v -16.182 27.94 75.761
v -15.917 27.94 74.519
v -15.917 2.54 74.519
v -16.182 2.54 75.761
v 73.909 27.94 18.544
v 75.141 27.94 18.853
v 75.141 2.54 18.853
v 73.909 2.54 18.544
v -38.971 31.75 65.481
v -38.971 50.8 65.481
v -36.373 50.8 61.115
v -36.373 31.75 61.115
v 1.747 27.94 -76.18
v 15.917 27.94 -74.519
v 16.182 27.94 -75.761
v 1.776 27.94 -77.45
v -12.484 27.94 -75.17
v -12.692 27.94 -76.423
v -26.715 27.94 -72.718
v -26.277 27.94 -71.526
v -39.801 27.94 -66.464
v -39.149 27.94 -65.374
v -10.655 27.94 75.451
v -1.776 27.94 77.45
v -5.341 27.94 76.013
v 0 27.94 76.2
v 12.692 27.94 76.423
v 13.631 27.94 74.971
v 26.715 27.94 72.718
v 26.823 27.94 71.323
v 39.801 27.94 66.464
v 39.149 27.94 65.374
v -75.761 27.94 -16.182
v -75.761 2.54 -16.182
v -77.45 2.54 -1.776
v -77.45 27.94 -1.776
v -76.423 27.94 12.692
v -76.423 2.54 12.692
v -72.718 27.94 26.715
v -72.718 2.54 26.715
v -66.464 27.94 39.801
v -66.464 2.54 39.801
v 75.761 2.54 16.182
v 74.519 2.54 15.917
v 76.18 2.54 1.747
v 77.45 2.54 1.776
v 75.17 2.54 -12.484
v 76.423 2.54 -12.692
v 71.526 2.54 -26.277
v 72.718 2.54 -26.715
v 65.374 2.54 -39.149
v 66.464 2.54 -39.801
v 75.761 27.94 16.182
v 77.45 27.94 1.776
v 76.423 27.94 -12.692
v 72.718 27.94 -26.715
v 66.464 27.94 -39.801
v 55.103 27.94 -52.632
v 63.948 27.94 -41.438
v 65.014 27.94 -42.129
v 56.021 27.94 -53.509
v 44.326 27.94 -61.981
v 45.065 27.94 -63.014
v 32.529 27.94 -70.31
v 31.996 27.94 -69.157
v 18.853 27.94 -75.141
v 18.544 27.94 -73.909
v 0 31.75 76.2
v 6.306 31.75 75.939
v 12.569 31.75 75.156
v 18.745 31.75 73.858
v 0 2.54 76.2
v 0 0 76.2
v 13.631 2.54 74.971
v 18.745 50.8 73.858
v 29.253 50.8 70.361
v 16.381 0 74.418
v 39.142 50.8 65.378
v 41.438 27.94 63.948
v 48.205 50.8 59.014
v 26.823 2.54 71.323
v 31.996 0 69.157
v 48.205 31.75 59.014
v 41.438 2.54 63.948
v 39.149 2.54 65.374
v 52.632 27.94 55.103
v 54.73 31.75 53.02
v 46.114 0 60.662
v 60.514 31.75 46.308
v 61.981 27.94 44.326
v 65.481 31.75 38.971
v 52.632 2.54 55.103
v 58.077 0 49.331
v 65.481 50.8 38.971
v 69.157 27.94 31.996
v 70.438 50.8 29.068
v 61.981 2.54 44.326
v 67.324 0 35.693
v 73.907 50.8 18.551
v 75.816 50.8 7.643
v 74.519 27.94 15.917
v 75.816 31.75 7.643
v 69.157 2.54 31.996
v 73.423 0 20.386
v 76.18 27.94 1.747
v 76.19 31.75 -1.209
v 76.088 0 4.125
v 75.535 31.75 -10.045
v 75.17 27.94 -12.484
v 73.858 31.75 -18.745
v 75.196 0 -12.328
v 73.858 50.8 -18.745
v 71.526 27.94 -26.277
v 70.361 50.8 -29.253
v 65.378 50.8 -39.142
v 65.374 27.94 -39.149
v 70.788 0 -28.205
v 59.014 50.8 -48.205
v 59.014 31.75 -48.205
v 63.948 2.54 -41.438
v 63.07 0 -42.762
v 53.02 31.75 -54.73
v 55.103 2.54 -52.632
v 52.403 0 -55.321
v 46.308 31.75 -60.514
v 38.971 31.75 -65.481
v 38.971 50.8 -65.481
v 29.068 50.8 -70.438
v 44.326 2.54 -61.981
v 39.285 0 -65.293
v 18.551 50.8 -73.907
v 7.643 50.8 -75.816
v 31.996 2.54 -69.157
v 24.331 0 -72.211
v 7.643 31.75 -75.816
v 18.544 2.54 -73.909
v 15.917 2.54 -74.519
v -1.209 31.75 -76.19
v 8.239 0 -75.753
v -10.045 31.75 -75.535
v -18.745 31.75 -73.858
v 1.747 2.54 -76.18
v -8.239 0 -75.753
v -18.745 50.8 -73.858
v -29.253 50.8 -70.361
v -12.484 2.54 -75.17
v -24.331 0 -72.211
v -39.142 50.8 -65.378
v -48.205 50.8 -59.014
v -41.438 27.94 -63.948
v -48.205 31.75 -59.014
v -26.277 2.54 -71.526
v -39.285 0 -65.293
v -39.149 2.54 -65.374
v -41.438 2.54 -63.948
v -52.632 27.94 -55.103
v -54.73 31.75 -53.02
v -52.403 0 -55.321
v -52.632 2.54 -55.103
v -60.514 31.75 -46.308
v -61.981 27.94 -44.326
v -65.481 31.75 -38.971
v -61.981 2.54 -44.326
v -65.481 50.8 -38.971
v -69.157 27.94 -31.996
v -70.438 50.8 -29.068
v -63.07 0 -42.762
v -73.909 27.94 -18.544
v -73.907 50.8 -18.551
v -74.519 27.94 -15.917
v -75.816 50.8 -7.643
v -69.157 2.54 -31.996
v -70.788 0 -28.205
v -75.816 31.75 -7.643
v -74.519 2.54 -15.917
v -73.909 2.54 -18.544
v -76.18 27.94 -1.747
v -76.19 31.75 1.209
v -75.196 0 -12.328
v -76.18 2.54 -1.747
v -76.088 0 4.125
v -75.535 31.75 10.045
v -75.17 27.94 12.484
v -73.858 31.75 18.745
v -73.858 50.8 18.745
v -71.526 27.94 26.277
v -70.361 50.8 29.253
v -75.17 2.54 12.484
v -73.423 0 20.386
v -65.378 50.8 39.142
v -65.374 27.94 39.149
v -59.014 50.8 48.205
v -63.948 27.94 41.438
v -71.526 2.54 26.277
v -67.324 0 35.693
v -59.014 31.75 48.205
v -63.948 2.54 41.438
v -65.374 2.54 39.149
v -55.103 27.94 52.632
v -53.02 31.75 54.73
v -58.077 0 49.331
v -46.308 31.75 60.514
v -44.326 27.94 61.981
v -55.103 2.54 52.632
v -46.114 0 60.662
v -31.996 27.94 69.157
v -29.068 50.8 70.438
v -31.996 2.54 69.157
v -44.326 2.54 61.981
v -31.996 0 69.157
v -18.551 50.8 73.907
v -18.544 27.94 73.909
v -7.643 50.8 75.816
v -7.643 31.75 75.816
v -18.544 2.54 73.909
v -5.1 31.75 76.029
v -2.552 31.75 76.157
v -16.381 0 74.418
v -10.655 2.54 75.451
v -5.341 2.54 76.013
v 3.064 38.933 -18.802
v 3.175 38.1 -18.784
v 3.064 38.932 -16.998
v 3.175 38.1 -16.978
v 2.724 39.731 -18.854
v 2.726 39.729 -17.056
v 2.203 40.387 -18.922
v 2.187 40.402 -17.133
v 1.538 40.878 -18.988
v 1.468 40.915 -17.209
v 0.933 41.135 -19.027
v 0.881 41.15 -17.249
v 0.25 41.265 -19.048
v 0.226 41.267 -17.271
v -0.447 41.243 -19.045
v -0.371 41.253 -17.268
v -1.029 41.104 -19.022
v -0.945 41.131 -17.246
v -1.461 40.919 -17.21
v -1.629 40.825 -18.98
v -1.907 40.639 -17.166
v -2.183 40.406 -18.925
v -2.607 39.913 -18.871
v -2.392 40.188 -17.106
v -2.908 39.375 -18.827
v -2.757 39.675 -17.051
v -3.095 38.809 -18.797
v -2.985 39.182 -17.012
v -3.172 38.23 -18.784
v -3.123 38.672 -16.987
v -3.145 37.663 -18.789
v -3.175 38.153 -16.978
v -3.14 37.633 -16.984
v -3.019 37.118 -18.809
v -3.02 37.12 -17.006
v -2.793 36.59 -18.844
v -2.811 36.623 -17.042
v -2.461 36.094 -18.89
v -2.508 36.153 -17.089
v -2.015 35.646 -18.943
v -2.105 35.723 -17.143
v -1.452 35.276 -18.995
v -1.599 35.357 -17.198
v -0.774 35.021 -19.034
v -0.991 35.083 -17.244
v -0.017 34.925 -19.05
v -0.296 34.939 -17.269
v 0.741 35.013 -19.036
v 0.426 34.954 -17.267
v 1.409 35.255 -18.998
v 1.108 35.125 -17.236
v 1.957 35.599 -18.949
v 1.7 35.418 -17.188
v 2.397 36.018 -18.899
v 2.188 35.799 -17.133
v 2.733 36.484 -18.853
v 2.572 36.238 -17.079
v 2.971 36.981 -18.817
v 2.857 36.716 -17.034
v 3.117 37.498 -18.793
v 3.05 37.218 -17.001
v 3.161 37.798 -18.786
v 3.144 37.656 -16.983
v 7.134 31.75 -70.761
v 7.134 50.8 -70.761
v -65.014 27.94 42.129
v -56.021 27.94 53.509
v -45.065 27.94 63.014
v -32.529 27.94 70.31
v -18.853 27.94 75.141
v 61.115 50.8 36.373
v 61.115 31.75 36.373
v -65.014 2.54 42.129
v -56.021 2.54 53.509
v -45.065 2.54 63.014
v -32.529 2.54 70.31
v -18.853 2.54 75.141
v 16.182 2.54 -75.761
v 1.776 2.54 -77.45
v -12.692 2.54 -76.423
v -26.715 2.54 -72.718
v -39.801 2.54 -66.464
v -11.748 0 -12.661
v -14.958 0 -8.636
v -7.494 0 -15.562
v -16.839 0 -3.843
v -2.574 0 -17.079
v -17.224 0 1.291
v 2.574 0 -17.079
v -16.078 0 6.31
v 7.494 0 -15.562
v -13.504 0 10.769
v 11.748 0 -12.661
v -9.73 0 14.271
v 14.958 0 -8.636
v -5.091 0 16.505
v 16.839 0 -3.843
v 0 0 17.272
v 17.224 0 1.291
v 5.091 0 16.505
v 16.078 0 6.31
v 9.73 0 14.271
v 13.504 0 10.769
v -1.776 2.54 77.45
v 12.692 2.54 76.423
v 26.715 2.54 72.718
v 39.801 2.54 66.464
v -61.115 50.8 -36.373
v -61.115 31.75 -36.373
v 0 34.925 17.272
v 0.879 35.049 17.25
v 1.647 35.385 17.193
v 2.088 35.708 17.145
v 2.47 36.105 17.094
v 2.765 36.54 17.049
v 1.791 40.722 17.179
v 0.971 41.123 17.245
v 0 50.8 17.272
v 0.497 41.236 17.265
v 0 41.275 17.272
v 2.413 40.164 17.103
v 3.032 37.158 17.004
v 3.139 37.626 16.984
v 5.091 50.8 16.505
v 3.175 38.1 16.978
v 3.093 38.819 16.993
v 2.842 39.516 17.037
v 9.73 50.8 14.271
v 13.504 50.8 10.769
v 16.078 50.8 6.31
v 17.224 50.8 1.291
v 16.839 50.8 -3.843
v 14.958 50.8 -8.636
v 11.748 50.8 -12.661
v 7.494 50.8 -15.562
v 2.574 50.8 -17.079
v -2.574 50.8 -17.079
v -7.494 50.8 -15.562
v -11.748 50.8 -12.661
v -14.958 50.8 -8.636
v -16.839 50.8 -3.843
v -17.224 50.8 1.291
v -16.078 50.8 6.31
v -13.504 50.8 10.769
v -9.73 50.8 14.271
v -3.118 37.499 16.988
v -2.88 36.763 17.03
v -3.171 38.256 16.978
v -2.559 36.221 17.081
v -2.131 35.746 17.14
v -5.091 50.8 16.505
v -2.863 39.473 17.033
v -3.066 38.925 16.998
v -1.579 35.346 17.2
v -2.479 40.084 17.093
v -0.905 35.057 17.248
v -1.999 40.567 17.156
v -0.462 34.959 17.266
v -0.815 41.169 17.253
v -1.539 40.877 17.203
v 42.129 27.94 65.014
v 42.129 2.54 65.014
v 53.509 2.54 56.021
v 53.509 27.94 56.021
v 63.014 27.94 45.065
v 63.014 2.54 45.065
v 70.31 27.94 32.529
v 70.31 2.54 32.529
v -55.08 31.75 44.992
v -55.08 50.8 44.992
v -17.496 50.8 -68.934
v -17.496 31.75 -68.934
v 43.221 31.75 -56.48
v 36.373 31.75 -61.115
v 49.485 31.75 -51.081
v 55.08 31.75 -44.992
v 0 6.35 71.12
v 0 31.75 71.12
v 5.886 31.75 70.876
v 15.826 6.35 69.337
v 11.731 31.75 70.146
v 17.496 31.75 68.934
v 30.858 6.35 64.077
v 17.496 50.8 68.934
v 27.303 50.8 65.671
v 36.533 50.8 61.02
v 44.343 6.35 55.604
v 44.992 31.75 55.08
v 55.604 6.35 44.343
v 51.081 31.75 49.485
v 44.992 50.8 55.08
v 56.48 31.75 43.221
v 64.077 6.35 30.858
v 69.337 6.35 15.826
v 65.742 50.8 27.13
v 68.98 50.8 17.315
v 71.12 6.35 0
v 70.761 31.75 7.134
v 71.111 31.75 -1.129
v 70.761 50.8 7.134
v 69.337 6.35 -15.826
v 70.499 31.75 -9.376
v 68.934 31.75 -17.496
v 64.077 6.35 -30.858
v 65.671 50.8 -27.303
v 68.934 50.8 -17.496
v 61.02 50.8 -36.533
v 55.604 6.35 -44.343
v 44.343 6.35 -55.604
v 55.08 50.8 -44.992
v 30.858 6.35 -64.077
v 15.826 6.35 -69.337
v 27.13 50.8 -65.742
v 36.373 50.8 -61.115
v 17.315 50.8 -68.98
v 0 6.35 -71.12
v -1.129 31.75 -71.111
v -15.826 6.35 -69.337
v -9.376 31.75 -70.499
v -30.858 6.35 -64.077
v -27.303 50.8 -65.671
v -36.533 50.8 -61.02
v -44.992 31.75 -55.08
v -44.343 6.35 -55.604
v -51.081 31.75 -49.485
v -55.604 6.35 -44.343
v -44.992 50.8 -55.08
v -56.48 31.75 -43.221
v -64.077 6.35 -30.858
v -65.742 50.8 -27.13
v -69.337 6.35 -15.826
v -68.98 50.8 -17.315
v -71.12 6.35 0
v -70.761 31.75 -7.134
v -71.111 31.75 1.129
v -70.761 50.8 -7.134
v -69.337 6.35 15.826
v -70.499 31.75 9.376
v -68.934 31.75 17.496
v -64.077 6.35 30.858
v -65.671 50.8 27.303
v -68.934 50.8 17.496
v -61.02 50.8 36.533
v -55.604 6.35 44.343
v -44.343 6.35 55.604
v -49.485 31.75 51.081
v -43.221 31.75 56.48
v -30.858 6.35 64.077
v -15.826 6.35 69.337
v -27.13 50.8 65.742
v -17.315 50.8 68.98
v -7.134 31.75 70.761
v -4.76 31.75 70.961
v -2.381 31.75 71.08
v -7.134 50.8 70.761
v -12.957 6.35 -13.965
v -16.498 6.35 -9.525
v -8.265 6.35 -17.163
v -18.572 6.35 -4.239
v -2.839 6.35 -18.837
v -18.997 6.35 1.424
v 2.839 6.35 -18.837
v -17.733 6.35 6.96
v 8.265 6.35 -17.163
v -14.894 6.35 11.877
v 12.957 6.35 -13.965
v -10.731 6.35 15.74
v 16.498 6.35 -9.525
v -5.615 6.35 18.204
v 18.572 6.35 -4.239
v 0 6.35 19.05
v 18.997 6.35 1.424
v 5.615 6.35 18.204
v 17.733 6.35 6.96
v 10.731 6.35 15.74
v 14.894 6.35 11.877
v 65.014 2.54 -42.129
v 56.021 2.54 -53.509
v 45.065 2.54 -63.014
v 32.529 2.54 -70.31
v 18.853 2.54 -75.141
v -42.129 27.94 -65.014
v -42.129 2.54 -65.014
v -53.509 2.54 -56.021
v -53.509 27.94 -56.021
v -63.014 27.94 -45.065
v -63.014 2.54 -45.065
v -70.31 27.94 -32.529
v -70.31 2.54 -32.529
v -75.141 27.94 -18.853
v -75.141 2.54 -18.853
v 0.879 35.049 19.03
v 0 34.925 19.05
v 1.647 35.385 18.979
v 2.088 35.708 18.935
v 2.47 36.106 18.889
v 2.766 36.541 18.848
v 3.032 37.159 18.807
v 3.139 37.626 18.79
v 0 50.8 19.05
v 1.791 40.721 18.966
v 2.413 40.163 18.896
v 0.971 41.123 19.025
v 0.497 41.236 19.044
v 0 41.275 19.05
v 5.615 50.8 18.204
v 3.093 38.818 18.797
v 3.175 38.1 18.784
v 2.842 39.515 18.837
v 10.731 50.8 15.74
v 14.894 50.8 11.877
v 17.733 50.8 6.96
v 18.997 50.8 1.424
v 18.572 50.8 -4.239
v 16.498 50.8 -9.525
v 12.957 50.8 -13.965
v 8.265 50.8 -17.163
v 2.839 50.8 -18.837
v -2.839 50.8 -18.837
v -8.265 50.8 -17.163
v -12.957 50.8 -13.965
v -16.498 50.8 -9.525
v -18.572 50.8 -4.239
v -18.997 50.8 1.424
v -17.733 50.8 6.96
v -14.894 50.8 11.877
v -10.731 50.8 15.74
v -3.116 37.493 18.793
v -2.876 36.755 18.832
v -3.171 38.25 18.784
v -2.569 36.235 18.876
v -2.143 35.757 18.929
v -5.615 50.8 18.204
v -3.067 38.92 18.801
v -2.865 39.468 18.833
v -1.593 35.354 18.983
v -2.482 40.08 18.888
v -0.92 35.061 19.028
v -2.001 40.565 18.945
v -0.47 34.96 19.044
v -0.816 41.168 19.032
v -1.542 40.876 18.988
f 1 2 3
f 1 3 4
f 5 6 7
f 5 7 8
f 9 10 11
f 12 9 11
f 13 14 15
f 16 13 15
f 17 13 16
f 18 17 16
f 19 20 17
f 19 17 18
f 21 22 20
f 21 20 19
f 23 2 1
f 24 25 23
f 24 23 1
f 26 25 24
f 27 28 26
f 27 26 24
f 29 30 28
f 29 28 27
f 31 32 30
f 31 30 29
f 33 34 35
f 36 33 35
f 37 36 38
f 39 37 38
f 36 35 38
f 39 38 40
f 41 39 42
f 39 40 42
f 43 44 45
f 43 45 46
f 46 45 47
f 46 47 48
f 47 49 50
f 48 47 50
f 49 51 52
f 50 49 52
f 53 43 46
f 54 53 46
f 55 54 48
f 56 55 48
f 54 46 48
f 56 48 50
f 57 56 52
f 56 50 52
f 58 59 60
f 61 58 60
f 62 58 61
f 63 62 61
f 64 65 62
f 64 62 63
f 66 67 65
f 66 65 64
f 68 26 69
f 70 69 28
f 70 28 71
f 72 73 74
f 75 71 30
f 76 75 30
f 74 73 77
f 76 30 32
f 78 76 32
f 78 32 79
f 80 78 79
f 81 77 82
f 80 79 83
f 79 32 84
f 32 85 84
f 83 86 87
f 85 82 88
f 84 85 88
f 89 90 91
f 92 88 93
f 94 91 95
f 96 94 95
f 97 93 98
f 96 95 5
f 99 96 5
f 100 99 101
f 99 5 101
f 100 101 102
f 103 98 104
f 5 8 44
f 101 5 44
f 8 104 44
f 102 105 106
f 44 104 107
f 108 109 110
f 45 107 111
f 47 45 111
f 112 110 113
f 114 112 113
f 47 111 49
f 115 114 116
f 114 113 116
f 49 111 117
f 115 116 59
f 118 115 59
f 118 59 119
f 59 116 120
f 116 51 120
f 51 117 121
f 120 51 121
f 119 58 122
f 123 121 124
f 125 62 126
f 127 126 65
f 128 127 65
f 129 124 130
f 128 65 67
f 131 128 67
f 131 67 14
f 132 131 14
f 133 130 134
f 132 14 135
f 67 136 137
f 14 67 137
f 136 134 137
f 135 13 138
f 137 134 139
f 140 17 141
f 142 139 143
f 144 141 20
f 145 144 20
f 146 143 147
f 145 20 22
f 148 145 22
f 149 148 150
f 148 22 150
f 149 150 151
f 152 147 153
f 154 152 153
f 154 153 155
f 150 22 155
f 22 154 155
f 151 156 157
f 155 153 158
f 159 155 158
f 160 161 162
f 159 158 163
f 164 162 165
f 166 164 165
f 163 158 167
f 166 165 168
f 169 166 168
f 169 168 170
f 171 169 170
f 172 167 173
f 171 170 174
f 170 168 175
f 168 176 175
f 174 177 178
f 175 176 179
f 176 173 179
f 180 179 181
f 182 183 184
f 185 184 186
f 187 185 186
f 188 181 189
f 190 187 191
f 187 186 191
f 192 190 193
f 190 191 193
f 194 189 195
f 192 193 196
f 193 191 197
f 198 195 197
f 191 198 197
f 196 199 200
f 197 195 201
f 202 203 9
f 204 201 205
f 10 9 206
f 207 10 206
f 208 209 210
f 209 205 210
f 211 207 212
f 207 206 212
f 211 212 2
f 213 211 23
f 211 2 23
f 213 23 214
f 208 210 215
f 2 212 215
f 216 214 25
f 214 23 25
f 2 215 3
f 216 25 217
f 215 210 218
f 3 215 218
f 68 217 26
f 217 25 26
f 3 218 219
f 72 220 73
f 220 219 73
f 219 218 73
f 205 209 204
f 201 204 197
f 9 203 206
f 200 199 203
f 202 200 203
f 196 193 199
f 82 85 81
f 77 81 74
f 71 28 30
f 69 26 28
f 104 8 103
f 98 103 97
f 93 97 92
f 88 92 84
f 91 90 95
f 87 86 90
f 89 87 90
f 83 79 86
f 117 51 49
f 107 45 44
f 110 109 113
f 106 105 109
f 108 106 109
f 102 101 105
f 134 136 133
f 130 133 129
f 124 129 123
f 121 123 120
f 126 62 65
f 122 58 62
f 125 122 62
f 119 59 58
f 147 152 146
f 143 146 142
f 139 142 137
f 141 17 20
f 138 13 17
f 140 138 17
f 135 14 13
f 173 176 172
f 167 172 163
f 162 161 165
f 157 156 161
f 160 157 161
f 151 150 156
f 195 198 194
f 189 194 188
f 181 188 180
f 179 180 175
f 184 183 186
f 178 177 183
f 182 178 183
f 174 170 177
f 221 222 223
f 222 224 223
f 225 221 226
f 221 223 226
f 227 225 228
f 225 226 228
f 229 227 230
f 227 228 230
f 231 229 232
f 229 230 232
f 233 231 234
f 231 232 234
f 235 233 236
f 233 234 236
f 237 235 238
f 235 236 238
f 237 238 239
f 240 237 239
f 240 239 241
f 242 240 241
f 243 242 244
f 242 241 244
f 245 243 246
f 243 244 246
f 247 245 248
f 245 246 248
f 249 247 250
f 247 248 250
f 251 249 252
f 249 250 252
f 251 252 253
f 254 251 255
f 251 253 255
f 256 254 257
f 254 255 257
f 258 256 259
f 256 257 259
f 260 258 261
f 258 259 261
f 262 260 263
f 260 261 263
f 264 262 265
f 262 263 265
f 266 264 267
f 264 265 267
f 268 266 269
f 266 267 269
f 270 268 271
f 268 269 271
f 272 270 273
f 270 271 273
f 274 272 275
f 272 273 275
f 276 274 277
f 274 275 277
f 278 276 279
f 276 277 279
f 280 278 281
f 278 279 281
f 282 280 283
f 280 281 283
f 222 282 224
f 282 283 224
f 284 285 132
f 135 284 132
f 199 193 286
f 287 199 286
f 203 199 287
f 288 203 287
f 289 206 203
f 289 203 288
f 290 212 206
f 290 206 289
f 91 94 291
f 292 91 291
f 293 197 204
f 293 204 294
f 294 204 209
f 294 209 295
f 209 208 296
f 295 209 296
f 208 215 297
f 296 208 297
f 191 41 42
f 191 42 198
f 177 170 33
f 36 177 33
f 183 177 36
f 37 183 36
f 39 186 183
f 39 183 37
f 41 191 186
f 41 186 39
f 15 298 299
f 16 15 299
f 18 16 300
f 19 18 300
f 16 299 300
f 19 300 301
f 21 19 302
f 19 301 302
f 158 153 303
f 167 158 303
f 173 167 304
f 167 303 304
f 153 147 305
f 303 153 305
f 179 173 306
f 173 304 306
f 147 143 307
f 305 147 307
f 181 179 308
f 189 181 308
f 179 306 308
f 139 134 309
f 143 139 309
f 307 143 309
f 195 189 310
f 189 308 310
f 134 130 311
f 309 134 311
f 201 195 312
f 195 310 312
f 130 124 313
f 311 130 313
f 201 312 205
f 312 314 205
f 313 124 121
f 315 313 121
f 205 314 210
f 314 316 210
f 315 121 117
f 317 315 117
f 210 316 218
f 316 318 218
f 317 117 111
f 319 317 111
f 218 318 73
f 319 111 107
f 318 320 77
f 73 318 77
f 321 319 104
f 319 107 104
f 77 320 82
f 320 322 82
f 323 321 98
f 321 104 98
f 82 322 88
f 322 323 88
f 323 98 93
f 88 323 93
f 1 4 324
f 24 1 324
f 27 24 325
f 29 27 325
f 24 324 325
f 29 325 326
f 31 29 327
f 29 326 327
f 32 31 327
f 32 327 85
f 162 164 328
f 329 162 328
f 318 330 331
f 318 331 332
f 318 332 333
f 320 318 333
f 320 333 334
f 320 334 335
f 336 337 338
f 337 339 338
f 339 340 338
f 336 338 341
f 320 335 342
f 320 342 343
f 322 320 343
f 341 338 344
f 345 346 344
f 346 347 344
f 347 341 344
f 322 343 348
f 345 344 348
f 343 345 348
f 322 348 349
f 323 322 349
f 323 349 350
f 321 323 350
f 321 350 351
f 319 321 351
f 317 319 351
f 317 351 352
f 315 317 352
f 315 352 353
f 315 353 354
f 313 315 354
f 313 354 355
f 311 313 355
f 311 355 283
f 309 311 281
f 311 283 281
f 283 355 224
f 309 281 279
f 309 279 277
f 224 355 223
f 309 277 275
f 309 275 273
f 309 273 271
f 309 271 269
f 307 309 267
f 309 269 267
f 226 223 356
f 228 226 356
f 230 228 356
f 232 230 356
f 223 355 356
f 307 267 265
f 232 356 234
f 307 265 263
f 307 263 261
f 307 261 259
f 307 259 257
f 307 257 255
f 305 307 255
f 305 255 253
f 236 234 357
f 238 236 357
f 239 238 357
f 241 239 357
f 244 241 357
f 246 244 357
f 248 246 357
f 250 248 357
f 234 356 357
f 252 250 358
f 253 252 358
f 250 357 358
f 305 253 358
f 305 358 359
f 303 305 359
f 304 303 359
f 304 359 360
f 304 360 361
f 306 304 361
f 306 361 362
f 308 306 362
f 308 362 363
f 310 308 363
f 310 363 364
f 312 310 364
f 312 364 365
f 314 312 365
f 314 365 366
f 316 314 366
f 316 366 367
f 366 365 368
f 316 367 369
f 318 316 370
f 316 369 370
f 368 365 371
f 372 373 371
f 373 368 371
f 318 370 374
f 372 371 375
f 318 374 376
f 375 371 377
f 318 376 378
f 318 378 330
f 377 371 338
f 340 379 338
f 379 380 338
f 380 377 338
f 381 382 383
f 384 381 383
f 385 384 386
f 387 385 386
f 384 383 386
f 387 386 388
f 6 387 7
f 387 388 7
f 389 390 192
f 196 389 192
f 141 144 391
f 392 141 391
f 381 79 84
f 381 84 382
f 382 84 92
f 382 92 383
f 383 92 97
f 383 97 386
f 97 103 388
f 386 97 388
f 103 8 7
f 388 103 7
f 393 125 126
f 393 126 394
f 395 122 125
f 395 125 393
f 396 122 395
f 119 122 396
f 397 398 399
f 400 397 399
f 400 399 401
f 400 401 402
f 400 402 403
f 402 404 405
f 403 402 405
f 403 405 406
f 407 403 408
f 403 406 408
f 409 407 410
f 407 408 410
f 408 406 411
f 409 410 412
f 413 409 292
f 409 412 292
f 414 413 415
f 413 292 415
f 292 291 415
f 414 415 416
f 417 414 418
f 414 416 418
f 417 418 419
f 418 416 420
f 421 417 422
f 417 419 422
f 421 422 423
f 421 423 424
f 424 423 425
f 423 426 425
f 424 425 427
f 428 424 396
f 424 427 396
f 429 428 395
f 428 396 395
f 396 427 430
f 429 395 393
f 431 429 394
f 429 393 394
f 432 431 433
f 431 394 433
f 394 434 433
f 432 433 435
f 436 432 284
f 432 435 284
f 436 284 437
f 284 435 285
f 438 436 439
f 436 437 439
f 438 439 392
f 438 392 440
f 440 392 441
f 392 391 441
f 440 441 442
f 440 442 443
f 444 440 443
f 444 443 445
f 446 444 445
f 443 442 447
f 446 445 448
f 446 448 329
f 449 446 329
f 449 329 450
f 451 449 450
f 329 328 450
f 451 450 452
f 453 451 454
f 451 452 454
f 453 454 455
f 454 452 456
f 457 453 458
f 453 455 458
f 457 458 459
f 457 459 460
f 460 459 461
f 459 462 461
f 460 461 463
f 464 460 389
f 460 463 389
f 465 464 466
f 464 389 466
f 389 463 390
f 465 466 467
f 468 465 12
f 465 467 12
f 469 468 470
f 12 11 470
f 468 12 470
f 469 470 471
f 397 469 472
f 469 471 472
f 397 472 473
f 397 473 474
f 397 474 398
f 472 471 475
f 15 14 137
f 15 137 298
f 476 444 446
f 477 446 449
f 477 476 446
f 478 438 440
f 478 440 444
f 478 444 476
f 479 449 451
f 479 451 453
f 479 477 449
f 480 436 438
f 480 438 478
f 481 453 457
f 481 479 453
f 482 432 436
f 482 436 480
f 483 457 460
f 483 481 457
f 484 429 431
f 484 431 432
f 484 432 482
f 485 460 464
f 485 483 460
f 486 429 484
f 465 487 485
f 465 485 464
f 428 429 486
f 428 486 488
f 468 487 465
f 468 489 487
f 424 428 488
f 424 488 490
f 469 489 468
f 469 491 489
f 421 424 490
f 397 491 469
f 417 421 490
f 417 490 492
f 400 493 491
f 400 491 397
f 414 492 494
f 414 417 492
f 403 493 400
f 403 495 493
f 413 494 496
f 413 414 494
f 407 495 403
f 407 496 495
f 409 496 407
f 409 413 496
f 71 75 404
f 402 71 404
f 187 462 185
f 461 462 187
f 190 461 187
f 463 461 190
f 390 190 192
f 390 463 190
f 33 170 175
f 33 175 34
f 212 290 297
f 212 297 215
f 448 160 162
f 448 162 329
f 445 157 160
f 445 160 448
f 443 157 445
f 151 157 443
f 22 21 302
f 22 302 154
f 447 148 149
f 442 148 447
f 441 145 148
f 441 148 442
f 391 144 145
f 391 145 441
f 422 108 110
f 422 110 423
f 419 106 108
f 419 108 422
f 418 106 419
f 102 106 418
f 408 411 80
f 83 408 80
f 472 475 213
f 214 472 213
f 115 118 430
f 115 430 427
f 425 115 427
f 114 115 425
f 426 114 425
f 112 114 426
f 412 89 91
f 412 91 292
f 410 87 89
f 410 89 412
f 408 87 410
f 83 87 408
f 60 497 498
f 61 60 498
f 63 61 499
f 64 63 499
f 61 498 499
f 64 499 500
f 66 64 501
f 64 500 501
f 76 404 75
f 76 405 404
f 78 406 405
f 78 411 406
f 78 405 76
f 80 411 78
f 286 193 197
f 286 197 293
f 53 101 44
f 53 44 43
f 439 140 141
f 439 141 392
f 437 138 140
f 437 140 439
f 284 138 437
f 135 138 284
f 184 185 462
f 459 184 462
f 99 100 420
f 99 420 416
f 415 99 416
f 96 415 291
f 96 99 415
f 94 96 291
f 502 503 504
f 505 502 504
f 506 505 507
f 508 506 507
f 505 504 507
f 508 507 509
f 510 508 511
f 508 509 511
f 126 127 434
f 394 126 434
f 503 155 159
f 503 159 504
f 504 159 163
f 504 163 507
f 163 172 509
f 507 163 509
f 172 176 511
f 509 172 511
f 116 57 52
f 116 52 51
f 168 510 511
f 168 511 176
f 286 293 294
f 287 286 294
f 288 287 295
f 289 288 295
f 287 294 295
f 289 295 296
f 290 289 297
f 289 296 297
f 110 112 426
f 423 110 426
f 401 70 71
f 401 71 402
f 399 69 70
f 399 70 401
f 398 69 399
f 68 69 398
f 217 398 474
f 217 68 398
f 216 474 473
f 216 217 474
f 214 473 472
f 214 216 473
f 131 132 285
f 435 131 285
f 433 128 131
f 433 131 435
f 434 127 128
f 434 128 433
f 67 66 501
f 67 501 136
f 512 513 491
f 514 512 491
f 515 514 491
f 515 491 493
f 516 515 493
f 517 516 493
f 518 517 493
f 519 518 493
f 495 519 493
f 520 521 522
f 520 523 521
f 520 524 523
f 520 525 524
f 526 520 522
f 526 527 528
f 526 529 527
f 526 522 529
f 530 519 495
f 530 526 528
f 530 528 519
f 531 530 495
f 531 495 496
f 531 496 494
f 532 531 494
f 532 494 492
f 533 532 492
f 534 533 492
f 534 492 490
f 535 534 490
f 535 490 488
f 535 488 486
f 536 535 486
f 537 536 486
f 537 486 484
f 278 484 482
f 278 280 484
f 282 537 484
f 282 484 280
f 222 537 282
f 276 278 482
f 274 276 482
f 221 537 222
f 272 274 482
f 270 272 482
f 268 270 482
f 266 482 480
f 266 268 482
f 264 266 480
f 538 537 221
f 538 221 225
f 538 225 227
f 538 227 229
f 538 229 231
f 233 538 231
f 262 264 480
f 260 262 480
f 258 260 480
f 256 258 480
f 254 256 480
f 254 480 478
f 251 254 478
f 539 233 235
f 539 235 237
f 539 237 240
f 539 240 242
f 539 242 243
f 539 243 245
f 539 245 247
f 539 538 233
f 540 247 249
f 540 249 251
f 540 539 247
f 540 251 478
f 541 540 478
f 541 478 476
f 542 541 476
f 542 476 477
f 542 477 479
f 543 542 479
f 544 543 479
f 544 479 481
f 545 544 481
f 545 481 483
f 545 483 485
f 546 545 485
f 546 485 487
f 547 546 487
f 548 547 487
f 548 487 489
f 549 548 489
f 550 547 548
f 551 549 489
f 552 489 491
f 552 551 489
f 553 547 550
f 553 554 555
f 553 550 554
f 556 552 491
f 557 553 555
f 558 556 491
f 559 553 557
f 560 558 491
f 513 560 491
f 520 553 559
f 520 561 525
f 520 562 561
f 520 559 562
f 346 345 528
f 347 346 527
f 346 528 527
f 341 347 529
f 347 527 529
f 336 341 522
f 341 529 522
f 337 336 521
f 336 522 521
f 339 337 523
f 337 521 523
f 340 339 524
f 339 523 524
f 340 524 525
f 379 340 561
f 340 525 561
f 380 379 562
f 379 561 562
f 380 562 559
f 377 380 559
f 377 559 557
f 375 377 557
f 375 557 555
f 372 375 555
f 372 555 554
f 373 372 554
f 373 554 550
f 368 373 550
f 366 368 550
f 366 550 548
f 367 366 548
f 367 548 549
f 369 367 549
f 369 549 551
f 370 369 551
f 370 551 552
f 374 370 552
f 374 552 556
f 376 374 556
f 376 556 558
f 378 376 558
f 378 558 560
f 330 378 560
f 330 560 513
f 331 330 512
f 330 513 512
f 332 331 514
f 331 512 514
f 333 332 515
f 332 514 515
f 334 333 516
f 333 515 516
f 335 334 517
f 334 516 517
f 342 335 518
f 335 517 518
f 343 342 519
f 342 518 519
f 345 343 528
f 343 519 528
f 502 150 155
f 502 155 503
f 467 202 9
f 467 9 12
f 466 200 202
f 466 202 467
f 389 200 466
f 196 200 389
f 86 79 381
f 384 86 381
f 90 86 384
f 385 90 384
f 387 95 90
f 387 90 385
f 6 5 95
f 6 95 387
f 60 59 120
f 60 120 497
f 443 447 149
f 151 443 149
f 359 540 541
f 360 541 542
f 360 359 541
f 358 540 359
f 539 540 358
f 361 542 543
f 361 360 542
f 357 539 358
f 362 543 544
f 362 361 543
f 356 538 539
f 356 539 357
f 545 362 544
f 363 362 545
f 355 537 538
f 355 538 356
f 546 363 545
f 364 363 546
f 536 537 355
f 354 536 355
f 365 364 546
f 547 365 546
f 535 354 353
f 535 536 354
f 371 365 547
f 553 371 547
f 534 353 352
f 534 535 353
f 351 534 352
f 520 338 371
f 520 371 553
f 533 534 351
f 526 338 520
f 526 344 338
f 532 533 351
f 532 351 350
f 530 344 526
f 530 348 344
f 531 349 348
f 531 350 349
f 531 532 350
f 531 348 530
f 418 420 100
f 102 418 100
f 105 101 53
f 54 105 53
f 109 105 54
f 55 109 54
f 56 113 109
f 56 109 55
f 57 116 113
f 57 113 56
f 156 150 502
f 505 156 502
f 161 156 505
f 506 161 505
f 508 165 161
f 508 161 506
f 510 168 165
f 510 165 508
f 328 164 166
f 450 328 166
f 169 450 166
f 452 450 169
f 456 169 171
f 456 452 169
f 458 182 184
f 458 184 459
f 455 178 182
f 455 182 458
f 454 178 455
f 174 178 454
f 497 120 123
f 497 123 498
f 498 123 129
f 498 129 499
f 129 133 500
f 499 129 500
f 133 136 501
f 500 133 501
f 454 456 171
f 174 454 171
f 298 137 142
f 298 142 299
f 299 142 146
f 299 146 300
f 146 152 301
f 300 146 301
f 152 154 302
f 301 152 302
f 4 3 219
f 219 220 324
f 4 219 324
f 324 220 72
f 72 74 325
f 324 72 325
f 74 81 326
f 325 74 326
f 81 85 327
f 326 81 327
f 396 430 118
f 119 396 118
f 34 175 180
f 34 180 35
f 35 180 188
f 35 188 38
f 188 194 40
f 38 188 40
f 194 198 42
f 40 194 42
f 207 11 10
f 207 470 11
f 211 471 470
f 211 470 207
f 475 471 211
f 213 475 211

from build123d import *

# Parameters (mm, degrees)
SKETCH2_R           = 76.2
BOSS_EXTRUDE1_DEPTH = 50.8
SKETCH3_R           = 71.12
SKETCH3_R_2         = 19.05
CUT_EXTRUDE1_DEPTH  = 44.45
SKETCH4_R           = 17.272
CUT_EXTRUDE2_DEPTH  = 120.1365603
CUT_EXTRUDE3_DEPTH  = 19.05
CIRPATTERN1_COUNT   = 8
SKETCH6_R           = 3.175
CUT_EXTRUDE4_DEPTH  = 25.4
WRAP1_START         = 2.54
WRAP1_DEPTH         = 25.4
CIRPATTERN2_COUNT   = 8


# Read off the part's stored shape, not the designer's step: Wrap1
with BuildPart() as part:
    # Sketch2 → Boss-Extrude1 (new body)
    with BuildSketch(Plane(origin=(0, 0, 0), x_dir=(1, 0, 0), z_dir=(0, 1, 0))):
        with Locations(Location((0, 0, 0), (0, 0, 270))):
            Circle(SKETCH2_R)
    extrude(amount=BOSS_EXTRUDE1_DEPTH)

    # Sketch3 → Cut-Extrude1 (cut)
    with BuildSketch(Plane(origin=(0, 50.8, 0), x_dir=(1, 0, 0), z_dir=(0, 1, 0))):
        with Locations(Location((0, 0, 0), (0, 0, 270))):
            Circle(SKETCH3_R)
        with Locations(Location((0, 0, 0), (0, 0, 270))):
            Circle(SKETCH3_R_2, mode=Mode.SUBTRACT)
    extrude(amount=-CUT_EXTRUDE1_DEPTH, mode=Mode.SUBTRACT)

    # Sketch4 → Cut-Extrude2 (cut, through all)
    with BuildSketch(Plane(origin=(0, 50.8, 0), x_dir=(1, 0, 0), z_dir=(0, 1, 0))):
        with Locations(Location((0, 0, 0), (0, 0, 270))):
            Circle(SKETCH4_R)
    extrude(amount=-CUT_EXTRUDE2_DEPTH, mode=Mode.SUBTRACT)

    # Sketch5 → Cut-Extrude3 (cut)
    with BuildSketch(Plane(origin=(0, 50.8, 0), x_dir=(1, 0, 0), z_dir=(0, 1, 0))):
        with BuildLine():
            Line((-44.991655358, 55.079990451), (-48.205345027, 59.014275484))
            ThreePointArc((-48.205345027, 59.014275484), (-57.719695429, 49.748133227), (-65.480674483, 38.970774553))
            Line((-65.480674483, 38.970774553), (-61.115296184, 36.372722916))
            ThreePointArc((-61.115296184, 36.372722916), (-53.871715734, 46.431591012), (-44.991655358, 55.079990451))
        make_face()
    cut_extrude3 = extrude(amount=-CUT_EXTRUDE3_DEPTH, mode=Mode.SUBTRACT)

    # CirPattern1: Cut-Extrude3 ×8 about axis
    cirpattern1_axis = Axis((0, 0, 0), (0, 1, 0))
    for i in range(1, CIRPATTERN1_COUNT):
        add(cut_extrude3.rotate(cirpattern1_axis, i * 360 / CIRPATTERN1_COUNT), mode=Mode.SUBTRACT)

    # Sketch6 → Cut-Extrude4 (cut, symmetric)
    with BuildSketch(Plane.XY):
        with Locations((0, 38.1)):
            Circle(SKETCH6_R)
    extrude(amount=CUT_EXTRUDE4_DEPTH, both=True, mode=Mode.SUBTRACT)

    # Wrap1 outline → Wrap1 (add)
    with BuildSketch(Plane(origin=(0, 0, 0), x_dir=(1, 0, 0), z_dir=(0, 1, 0)).offset(WRAP1_START)):
        with BuildLine():
            ThreePointArc((75.761080539, -16.182075751), (76.423312697, 12.691657751), (66.463869373, 39.801444294))
            Line((66.463869373, 39.801444294), (65.374297744, 39.148961601))
            ThreePointArc((65.374297744, 39.148961601), (75.170471505, 12.483597787), (74.519095612, -15.916795821))
            Line((74.519095612, -15.916795821), (75.761080539, -16.182075751))
        make_face()
    wrap1 = extrude(amount=WRAP1_DEPTH)

    # CirPattern2: Wrap1 ×8 about axis
    cirpattern2_axis = Axis((0, 0, 0), (0, 1, 0))
    for i in range(1, CIRPATTERN2_COUNT):
        add(wrap1.rotate(cirpattern2_axis, i * 360 / CIRPATTERN2_COUNT))


solid = part.part
